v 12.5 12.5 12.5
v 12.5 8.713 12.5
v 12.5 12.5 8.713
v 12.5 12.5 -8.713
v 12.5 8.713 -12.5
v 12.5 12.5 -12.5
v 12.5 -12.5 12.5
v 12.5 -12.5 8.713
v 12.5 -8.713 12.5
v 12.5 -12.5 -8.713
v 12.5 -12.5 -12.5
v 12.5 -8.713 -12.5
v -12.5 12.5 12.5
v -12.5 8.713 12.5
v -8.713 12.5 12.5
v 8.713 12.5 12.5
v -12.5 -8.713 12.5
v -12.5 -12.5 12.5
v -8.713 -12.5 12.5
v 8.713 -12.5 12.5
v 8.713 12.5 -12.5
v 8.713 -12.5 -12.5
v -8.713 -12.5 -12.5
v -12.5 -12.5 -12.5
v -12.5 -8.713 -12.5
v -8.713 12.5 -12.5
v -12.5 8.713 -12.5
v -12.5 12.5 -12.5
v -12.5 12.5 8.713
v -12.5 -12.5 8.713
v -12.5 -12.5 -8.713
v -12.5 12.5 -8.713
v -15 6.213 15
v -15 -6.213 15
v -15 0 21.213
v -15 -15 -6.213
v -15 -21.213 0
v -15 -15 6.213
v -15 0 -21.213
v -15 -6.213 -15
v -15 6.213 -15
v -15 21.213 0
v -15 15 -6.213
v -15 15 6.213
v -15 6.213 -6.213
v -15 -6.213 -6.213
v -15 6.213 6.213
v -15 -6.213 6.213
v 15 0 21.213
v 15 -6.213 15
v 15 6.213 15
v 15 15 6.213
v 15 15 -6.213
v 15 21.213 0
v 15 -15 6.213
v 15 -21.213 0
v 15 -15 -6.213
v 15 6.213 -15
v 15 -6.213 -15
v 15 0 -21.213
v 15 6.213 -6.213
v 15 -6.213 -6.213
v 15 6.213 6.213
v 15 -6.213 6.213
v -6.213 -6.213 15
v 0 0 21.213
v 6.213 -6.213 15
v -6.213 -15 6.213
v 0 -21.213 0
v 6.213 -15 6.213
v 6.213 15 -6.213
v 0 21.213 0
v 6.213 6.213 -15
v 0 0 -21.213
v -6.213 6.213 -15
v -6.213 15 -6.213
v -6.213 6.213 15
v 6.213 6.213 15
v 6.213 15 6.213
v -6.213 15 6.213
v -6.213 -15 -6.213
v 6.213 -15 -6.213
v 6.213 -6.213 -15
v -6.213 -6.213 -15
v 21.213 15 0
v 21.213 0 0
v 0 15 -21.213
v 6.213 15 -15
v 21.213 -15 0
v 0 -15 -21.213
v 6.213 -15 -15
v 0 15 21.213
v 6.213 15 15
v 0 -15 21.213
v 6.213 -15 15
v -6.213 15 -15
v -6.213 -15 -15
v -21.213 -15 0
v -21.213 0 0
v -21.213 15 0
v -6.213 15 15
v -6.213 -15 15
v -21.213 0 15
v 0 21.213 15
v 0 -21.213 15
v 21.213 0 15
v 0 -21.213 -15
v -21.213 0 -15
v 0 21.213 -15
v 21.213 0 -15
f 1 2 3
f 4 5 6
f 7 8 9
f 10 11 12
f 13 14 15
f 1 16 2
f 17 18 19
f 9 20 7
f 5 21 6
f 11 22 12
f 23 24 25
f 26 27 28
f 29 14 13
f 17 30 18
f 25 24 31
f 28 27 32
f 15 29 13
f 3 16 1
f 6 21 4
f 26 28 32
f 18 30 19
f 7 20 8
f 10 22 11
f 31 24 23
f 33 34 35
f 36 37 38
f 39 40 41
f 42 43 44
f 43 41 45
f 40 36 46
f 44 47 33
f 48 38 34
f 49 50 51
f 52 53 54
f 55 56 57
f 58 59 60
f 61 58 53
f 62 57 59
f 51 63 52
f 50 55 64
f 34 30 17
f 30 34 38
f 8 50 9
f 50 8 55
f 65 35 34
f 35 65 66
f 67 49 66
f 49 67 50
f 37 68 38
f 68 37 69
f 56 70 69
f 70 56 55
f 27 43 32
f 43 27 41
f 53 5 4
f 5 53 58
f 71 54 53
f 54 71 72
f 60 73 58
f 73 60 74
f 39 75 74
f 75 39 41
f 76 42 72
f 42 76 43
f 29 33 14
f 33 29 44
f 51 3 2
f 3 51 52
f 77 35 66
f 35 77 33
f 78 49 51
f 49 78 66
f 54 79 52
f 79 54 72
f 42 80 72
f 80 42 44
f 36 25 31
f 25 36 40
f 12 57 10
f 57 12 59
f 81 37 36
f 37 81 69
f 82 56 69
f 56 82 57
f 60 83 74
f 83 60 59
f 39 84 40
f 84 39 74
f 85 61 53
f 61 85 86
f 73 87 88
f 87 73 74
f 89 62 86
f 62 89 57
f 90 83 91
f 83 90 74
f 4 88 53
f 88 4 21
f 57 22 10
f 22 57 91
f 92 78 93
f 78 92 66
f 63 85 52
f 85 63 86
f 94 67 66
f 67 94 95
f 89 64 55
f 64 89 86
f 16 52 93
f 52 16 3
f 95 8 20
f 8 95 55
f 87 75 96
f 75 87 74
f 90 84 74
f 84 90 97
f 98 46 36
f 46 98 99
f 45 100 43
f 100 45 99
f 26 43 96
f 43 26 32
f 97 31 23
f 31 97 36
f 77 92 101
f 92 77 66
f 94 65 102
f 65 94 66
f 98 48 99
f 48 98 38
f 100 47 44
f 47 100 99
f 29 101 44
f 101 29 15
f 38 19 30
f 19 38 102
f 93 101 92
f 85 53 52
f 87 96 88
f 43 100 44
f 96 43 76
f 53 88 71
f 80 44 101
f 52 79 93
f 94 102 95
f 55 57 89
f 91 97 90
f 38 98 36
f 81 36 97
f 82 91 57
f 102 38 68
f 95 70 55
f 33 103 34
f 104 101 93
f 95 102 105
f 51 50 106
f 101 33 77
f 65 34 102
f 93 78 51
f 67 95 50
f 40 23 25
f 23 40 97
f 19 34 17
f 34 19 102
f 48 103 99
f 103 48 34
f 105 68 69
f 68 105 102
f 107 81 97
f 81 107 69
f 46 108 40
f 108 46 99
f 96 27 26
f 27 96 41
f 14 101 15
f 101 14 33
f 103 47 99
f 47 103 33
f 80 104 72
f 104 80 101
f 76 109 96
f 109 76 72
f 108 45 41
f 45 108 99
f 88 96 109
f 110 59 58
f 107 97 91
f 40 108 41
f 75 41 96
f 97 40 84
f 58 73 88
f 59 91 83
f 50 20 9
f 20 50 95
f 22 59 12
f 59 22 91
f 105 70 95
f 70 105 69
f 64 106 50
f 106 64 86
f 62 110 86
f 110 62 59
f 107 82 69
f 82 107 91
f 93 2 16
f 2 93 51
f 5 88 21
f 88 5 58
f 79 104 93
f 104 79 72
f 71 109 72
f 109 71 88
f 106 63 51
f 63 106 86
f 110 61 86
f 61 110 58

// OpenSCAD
size=30;

union()	{
cube(size-5, true);
rotate([45,0,0]) cube(size, true);
rotate([0,45,0]) cube(size, true);
rotate([0,0,45]) cube(size, true);

}
